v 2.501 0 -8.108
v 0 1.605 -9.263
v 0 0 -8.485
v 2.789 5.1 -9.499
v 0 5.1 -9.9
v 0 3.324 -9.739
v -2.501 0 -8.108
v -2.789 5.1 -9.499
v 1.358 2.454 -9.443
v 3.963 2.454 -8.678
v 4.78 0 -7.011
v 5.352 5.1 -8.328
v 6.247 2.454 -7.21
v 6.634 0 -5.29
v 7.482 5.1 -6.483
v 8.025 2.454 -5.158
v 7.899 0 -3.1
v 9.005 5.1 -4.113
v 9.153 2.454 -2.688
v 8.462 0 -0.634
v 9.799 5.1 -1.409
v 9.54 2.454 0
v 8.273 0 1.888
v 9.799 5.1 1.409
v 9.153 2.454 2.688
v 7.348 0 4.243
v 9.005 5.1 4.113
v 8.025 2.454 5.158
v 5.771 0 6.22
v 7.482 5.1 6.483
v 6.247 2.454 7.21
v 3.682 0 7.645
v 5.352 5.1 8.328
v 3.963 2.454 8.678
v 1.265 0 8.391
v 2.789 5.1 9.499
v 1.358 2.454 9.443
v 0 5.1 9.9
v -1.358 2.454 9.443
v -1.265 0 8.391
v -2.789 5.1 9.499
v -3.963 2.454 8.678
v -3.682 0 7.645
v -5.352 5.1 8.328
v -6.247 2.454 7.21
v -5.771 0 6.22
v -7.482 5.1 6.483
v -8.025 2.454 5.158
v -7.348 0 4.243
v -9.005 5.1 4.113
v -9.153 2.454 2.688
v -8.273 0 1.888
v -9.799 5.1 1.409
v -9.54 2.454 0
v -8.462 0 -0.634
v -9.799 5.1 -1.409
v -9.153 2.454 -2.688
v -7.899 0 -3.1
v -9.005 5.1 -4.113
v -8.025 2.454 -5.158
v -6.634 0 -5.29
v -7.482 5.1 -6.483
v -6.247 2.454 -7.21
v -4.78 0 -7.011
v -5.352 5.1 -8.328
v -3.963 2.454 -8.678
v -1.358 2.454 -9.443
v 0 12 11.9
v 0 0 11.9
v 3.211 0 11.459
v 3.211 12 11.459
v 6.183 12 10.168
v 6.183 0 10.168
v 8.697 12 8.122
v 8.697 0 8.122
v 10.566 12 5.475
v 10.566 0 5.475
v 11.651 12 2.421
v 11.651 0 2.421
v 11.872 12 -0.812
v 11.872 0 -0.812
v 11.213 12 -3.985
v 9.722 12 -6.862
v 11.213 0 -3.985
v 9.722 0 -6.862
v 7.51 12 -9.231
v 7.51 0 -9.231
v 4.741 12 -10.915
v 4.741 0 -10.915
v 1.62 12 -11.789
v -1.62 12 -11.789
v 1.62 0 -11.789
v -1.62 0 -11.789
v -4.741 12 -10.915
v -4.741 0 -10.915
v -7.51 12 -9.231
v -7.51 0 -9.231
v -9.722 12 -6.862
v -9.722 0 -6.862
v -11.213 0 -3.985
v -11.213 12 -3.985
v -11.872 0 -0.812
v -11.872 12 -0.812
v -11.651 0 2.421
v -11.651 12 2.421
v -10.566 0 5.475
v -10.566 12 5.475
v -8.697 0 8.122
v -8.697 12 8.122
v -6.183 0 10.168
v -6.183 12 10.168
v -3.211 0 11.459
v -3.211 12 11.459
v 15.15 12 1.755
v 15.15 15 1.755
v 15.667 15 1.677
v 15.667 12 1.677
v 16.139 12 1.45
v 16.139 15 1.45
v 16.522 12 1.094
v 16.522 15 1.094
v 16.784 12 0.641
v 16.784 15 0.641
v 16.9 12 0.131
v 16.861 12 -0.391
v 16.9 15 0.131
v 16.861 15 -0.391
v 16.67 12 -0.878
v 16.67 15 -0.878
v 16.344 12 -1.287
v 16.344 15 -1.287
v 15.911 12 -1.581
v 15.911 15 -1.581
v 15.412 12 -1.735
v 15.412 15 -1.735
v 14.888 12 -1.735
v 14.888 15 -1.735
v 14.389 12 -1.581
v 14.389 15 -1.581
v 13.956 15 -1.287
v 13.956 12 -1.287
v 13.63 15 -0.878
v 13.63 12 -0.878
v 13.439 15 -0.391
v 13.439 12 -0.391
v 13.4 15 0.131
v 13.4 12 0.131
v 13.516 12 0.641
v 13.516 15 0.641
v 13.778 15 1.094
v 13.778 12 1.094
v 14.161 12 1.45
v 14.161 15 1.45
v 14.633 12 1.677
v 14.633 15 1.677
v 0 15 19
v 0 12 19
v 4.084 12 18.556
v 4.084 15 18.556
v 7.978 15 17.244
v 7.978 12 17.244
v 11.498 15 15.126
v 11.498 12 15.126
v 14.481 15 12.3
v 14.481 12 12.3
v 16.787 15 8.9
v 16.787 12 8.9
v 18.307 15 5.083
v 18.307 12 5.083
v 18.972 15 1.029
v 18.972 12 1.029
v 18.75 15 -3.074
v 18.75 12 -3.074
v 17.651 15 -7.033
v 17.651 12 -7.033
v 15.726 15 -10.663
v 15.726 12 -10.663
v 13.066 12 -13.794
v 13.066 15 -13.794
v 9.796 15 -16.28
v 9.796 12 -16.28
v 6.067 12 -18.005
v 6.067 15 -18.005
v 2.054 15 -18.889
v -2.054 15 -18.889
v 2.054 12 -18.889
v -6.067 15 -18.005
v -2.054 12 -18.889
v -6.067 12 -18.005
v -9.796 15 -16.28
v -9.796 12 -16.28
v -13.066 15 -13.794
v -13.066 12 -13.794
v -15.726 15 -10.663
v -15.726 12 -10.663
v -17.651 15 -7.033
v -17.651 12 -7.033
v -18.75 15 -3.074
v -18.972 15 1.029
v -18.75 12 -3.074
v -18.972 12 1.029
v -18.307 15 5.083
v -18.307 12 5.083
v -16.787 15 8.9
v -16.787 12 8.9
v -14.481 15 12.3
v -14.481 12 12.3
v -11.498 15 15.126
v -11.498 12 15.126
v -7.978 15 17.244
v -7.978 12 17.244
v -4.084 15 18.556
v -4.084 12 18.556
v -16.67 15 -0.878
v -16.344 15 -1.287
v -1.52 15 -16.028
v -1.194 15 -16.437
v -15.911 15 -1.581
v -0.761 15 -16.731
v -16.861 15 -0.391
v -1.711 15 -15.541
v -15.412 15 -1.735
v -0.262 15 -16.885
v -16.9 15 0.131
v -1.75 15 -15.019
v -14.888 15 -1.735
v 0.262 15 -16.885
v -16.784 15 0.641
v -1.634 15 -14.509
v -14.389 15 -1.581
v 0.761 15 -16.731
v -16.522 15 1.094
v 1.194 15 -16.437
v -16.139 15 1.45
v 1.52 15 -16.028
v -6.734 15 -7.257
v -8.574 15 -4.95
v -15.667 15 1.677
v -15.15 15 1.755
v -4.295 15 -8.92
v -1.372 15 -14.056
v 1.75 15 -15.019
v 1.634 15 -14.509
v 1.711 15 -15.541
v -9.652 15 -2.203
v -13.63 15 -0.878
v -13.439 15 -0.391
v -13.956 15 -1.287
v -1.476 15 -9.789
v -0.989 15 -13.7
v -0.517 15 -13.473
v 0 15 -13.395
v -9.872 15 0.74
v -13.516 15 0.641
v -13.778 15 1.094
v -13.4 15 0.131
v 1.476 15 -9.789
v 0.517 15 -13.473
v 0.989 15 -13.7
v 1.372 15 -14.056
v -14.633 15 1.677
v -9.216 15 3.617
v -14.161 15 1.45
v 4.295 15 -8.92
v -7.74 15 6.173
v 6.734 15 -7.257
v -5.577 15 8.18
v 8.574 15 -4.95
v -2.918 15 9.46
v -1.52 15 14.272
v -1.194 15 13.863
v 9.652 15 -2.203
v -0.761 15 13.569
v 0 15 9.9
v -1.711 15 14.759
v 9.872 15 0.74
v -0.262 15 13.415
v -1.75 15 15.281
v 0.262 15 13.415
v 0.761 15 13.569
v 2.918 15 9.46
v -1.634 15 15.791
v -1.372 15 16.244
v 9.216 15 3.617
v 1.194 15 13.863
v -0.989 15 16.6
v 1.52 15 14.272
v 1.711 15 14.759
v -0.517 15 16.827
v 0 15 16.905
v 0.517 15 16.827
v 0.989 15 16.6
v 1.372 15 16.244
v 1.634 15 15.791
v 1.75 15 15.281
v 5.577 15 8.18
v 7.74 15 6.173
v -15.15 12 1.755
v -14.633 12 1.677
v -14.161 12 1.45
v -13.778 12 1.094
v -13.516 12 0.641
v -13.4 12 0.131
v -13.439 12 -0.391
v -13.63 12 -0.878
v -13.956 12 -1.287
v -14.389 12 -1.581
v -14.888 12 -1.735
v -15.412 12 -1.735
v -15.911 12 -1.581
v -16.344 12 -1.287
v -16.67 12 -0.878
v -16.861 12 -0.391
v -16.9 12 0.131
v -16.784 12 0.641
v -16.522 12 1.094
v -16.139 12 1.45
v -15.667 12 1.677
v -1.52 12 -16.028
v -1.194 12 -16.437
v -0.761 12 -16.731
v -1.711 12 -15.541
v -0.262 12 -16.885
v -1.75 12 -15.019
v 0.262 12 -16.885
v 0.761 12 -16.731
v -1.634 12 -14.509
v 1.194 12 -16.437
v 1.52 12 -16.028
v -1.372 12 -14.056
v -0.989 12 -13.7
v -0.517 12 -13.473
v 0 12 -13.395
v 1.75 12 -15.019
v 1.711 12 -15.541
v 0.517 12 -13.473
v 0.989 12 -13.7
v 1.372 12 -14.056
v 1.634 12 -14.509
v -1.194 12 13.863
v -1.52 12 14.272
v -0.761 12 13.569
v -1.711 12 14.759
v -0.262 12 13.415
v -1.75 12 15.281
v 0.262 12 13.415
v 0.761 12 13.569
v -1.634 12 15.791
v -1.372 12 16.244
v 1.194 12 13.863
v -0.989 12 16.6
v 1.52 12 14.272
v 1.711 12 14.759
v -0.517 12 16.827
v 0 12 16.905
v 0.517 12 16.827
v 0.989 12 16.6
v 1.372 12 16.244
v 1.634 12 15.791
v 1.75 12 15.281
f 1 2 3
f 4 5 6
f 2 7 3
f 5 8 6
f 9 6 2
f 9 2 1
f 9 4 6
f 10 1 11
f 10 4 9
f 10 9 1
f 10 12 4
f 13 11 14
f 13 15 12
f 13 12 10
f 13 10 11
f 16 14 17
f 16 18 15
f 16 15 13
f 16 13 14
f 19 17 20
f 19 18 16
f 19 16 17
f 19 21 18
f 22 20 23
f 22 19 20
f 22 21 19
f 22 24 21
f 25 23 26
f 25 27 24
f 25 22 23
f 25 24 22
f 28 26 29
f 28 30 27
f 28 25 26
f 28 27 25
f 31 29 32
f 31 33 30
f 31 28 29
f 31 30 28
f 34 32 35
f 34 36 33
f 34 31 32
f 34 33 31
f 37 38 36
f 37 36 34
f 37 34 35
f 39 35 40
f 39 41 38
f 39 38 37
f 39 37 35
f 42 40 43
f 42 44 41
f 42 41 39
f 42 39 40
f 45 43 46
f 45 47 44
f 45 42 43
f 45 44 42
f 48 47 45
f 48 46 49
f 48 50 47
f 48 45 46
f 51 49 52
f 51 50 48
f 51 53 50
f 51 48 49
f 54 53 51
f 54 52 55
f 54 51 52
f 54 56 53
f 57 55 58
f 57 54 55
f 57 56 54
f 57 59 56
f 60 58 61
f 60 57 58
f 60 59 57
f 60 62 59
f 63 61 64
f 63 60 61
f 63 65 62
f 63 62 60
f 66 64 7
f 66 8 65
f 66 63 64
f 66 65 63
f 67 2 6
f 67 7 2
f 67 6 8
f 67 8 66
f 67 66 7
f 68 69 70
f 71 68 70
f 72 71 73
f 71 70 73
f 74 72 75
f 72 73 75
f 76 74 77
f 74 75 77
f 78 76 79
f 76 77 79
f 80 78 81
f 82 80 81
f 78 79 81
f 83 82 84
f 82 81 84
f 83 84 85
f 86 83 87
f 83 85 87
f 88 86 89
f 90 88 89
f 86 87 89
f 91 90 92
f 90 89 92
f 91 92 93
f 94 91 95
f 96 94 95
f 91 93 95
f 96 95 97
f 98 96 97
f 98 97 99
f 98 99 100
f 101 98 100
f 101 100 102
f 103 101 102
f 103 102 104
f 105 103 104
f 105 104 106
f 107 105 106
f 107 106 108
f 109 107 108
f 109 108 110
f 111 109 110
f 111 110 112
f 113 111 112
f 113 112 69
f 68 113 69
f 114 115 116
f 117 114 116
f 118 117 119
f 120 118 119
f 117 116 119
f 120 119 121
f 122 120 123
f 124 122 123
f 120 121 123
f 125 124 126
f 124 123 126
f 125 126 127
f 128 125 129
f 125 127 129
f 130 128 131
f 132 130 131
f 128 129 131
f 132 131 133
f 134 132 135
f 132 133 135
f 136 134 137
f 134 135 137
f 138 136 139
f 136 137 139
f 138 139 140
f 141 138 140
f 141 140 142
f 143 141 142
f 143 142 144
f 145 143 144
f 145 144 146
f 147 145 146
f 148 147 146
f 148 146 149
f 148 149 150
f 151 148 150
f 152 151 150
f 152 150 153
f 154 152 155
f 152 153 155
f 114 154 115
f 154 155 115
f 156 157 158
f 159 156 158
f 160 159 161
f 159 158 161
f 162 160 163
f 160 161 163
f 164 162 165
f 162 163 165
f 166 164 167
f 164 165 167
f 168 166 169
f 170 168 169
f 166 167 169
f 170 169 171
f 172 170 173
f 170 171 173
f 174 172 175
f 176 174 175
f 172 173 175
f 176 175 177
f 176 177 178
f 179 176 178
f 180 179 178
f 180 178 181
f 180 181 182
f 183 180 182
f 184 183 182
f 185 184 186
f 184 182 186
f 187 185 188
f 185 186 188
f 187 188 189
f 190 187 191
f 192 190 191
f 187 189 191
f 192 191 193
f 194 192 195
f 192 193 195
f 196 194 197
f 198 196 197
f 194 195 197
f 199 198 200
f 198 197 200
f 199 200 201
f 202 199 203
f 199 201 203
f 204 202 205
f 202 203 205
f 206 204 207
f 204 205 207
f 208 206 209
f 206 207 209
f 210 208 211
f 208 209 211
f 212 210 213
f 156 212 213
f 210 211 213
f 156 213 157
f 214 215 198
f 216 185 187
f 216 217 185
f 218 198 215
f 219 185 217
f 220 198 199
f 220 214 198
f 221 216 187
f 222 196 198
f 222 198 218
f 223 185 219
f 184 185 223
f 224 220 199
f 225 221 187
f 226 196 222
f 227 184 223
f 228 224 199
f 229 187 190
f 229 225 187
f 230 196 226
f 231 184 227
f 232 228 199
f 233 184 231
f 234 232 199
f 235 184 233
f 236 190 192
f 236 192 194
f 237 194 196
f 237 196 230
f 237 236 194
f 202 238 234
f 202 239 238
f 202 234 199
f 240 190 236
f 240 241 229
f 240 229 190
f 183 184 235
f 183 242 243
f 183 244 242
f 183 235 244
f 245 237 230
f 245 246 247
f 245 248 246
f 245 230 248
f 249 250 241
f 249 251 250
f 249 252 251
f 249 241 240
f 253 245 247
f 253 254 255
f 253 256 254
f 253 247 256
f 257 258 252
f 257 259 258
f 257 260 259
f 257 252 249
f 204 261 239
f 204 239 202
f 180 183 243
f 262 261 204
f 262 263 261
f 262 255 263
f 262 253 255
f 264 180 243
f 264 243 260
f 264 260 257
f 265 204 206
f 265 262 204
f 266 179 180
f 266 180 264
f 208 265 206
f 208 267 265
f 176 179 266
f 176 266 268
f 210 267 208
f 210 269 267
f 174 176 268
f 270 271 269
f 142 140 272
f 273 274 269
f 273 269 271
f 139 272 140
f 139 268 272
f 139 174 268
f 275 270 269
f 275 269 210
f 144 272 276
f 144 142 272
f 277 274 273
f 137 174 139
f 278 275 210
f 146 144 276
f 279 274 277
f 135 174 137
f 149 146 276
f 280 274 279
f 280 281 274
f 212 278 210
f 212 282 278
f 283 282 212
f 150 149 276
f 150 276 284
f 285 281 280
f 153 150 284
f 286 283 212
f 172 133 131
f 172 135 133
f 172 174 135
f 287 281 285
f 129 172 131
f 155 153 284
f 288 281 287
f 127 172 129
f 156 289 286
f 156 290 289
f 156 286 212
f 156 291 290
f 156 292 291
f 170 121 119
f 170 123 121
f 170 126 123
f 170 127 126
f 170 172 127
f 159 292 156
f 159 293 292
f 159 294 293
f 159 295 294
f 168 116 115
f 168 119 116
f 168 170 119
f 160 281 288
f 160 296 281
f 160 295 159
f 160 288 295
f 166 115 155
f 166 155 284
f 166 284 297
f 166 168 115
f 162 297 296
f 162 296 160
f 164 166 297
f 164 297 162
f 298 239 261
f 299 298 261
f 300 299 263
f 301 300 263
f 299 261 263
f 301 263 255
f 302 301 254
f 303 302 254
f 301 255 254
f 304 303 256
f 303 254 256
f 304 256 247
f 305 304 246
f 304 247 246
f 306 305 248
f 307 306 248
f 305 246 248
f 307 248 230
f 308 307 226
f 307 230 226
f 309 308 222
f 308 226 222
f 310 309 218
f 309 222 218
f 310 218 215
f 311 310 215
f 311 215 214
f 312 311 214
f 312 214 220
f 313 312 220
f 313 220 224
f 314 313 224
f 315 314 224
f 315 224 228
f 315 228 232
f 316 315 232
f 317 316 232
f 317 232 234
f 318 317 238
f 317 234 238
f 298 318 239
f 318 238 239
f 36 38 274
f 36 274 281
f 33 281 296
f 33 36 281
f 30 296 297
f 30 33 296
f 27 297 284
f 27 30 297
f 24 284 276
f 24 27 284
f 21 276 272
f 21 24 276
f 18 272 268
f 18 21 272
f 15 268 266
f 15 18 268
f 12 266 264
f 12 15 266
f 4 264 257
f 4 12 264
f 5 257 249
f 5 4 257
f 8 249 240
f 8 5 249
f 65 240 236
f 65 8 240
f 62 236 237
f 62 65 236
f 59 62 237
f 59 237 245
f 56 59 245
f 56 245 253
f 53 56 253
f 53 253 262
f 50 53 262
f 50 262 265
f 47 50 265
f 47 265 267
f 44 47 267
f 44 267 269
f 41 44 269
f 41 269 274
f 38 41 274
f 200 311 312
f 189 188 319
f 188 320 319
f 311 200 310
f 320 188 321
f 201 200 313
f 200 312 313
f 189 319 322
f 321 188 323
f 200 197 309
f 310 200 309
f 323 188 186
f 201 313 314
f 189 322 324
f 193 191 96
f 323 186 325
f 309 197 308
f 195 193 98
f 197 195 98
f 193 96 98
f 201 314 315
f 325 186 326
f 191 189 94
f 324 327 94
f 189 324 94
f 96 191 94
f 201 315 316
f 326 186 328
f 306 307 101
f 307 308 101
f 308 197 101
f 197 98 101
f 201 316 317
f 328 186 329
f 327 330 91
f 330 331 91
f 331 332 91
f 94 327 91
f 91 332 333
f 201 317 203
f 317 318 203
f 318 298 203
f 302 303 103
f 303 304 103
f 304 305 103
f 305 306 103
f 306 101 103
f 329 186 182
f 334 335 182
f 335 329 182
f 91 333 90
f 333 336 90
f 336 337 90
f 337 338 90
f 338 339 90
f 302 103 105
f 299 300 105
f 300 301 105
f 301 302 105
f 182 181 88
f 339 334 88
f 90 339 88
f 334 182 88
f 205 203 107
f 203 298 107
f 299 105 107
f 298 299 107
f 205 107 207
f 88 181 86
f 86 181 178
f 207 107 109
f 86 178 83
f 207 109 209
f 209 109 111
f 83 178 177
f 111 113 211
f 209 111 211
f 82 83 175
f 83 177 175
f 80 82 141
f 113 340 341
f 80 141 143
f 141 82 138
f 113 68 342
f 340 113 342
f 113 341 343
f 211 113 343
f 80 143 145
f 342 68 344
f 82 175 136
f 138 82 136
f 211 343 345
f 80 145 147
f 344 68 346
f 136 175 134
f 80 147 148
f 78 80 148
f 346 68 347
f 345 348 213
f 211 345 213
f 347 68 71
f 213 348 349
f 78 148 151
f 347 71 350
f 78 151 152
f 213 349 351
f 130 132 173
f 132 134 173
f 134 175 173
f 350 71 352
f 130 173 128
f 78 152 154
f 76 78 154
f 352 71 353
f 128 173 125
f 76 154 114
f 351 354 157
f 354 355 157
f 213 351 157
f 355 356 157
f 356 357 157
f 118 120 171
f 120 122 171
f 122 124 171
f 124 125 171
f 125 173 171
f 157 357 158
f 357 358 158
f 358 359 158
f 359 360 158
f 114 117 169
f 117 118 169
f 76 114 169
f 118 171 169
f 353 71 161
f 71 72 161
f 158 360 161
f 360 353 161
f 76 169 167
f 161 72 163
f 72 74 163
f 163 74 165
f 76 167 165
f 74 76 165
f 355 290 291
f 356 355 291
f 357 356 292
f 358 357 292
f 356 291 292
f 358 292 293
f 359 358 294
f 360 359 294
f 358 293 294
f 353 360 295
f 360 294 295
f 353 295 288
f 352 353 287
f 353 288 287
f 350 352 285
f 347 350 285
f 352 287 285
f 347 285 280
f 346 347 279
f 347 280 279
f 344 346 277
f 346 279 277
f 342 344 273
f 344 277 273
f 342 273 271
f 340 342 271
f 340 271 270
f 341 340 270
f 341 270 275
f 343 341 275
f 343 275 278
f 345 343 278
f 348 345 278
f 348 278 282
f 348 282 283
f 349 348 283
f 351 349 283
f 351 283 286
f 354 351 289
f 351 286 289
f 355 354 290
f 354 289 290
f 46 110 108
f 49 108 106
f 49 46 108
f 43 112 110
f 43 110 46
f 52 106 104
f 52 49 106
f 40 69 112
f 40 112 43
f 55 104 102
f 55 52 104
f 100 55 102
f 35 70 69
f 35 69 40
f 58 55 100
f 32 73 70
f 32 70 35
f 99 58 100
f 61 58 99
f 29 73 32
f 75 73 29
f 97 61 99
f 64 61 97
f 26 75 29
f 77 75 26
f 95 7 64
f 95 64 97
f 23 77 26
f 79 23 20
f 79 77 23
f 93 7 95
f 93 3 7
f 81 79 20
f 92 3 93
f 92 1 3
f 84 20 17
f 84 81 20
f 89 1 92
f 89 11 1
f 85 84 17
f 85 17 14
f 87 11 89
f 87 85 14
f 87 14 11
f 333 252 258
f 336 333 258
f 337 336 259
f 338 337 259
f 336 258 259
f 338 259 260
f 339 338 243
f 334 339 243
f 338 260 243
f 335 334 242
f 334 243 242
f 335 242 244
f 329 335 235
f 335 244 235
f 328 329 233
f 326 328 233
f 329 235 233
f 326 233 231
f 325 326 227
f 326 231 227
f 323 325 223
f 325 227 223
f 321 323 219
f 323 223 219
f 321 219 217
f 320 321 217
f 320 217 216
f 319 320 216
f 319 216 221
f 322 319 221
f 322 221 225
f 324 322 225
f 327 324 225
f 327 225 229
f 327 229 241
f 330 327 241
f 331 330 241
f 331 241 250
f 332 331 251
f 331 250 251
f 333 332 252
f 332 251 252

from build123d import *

# Parameters (mm, degrees)
SKETCH1_R           = 11.9
SKETCH1_R_2         = 9.9
BOSS_EXTRUDE3_DEPTH = 15
SKETCH4_R           = 9.9
BOSS_EXTRUDE4_DEPTH = 5.1
BOSS_EXTRUDE8_START = -3
SKETCH12_R          = 19
SKETCH12_R_2        = 11.9
BOSS_EXTRUDE8_DEPTH = 3
SKETCH14_R          = 1.755
CUT_EXTRUDE4_DEPTH  = 3


with BuildPart() as part:
    # Sketch1 → Boss-Extrude3 (new body)
    with BuildSketch(Plane(origin=(0, 0, 0), x_dir=(1, 0, 0), z_dir=(0, 1, 0))):
        with Locations(Location((0, 0, 0), (0, 0, 270))):
            Circle(SKETCH1_R)
        with Locations(Location((0, 0, 0), (0, 0, 270))):
            Circle(SKETCH1_R_2, mode=Mode.SUBTRACT)
    extrude(amount=BOSS_EXTRUDE3_DEPTH)

    # Sketch4 → Boss-Extrude4 (add)
    with BuildSketch(Plane.XZ):
        with Locations(Location((0, 0, 0), (0, 0, 270))):
            Circle(SKETCH4_R)
    extrude(amount=-BOSS_EXTRUDE4_DEPTH)

    # Sketch7 → Cut-Revolve2 (revolve, cut)
    with BuildSketch(Plane(origin=(0, 0, 0), x_dir=(0, 0, -1), z_dir=(1, 0, 0))):
        with BuildLine():
            Line((0, 15), (0, -4.8))
            ThreePointArc((0, -4.8), (9.9, 5.1), (0, 15))
        make_face()
    revolve(axis=Axis((0, 15, 0), (0, -1, 0)), mode=Mode.SUBTRACT)

    # Sketch12 → Boss-Extrude8 (add)
    with BuildSketch(Plane(origin=(0, 15, 0), x_dir=(1, 0, 0), z_dir=(0, 1, 0)).offset(BOSS_EXTRUDE8_START)):
        with Locations(Location((0, 0, 0), (0, 0, 270))):
            Circle(SKETCH12_R)
        with Locations(Location((0, 0, 0), (0, 0, 270))):
            Circle(SKETCH12_R_2, mode=Mode.SUBTRACT)
    extrude(amount=BOSS_EXTRUDE8_DEPTH)

    # Sketch14 → Cut-Extrude4 (cut)
    with BuildSketch(Plane(origin=(0, 15, 0), x_dir=(1, 0, 0), z_dir=(0, 1, 0))):
        with Locations(Location((0, 15.15, 0), (0, 0, 270))):
            Circle(SKETCH14_R)
        with Locations(Location((-15.15, 0, 0), (0, 0, 270))):
            Circle(SKETCH14_R)
        with Locations(Location((0, -15.15, 0), (0, 0, 270))):
            Circle(SKETCH14_R)
        with Locations(Location((15.15, 0, 0), (0, 0, 270))):
            Circle(SKETCH14_R)
    extrude(amount=-CUT_EXTRUDE4_DEPTH, mode=Mode.SUBTRACT)


solid = part.part
